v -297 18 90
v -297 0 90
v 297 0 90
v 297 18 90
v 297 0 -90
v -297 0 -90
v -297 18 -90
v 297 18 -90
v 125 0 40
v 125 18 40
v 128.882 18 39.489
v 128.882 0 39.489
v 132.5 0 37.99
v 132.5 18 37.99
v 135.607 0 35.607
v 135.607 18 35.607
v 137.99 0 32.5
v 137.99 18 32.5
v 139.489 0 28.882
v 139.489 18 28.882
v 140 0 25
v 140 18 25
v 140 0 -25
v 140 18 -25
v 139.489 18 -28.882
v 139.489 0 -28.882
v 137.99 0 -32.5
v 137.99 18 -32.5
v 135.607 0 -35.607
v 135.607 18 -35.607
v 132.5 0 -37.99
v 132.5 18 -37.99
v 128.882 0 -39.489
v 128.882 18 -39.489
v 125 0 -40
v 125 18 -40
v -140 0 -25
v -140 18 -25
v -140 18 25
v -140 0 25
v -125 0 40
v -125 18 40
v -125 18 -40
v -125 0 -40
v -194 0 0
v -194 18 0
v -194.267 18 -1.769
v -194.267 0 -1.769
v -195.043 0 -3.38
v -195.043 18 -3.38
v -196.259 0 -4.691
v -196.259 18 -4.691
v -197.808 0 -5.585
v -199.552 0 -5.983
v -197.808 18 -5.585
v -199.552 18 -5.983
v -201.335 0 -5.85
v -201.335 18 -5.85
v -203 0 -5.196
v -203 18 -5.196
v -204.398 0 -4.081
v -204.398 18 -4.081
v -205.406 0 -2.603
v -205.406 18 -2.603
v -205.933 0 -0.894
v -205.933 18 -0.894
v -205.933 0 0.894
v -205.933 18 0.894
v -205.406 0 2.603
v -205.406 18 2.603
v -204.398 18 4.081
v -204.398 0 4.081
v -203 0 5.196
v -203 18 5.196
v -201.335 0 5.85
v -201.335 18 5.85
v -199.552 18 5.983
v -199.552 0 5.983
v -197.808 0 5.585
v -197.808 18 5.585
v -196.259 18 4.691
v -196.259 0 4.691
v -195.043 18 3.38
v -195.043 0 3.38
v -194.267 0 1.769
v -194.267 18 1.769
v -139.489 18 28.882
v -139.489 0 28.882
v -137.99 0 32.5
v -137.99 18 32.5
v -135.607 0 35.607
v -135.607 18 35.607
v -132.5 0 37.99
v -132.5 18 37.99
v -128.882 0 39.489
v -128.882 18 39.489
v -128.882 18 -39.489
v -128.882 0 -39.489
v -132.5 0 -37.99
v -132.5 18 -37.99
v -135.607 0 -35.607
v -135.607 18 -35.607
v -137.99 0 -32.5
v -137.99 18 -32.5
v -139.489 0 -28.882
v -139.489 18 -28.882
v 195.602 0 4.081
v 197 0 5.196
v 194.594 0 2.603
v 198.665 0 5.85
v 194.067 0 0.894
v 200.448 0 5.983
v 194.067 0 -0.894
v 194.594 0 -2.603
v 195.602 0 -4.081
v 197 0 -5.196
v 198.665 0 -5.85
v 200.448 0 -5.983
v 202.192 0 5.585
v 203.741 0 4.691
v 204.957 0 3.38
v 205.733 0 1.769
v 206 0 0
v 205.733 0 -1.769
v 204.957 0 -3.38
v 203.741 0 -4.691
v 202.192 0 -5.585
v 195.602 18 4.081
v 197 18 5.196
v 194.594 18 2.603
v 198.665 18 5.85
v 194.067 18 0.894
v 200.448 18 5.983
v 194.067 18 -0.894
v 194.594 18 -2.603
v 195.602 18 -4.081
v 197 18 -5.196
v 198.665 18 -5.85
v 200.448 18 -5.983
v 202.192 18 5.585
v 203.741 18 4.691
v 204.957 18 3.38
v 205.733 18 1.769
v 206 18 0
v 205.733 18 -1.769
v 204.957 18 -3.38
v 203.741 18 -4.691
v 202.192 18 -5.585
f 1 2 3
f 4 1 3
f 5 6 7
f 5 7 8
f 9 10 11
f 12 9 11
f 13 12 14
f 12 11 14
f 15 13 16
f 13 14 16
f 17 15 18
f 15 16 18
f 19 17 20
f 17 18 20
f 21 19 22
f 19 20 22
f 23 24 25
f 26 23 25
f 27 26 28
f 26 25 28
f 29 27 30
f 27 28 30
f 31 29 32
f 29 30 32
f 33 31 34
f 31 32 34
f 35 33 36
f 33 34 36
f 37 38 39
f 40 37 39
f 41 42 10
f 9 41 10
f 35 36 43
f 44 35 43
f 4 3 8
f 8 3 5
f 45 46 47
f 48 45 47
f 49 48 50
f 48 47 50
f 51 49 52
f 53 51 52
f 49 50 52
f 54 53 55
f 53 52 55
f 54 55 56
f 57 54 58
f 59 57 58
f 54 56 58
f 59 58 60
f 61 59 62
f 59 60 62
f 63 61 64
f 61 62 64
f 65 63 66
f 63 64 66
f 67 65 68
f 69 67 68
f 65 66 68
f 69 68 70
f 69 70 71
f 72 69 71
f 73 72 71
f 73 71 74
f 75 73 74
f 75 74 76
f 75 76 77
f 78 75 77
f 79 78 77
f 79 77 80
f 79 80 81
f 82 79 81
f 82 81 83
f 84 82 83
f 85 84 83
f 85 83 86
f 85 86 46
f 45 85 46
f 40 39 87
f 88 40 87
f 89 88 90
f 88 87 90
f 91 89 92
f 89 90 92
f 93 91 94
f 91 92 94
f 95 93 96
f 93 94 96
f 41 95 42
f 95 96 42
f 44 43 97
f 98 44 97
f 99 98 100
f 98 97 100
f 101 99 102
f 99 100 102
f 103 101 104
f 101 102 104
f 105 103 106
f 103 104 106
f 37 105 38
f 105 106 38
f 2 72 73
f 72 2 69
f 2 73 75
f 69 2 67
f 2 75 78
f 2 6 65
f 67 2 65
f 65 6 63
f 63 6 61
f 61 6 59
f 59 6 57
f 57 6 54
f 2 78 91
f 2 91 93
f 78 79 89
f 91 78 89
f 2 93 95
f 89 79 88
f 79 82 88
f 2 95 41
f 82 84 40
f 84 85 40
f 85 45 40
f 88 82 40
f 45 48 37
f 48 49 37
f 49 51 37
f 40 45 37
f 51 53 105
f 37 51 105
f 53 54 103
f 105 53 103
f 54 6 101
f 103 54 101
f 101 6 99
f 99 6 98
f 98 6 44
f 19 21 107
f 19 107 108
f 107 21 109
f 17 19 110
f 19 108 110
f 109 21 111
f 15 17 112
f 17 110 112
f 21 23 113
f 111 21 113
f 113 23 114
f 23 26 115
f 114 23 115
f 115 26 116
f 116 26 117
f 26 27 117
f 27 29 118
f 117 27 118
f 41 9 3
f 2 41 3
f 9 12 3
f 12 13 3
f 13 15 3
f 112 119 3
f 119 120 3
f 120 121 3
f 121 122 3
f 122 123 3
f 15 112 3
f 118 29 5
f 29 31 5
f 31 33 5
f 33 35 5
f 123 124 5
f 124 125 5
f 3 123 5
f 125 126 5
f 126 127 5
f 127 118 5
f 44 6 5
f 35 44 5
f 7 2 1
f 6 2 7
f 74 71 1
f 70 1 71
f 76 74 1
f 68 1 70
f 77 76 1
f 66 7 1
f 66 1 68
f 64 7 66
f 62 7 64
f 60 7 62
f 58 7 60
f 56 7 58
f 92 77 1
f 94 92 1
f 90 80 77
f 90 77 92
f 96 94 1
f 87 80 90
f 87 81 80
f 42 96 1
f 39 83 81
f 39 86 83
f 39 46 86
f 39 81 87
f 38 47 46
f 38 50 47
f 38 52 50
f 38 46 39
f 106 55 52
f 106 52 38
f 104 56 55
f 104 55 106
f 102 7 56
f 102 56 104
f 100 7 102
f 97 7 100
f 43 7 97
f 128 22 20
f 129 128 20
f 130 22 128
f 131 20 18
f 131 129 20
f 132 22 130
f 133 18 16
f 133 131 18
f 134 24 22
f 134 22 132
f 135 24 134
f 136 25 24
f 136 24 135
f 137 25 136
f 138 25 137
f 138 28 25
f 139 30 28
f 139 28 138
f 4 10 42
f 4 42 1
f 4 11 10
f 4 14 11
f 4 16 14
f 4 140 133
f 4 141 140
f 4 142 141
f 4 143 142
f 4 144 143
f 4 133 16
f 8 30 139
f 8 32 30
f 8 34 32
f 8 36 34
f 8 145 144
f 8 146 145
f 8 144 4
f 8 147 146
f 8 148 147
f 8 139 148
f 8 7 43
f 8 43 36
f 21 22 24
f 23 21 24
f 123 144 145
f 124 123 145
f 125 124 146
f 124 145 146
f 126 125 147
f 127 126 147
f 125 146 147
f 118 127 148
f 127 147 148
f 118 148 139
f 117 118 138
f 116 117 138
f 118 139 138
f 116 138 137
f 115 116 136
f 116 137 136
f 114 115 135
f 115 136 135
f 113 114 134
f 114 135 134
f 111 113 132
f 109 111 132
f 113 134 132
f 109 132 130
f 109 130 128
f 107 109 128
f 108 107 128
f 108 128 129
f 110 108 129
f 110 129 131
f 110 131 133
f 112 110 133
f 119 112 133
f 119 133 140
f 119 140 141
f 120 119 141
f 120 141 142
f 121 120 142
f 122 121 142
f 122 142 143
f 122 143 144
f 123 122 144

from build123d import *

# Parameters (mm, degrees)
SKETCH1_W           = 594
SKETCH1_H           = 180
BOSS_EXTRUDE1_DEPTH = 18
SKETCH2_R           = 6
CUT_EXTRUDE1_DEPTH  = 40


with BuildPart() as part:
    # Sketch1 → Boss-Extrude1 (new body)
    with BuildSketch(Plane(origin=(0, 0, 0), x_dir=(1, 0, 0), z_dir=(0, 1, 0))):
        Rectangle(SKETCH1_W, SKETCH1_H)
    extrude(amount=BOSS_EXTRUDE1_DEPTH)

    # Sketch2 → Cut-Extrude1 (cut)
    with BuildSketch(Plane(origin=(0, 18, 0), x_dir=(1, 0, 0), z_dir=(0, 1, 0))):
        with Locations((-200, 0)):
            Circle(SKETCH2_R)
        with Locations((200, 0)):
            Circle(SKETCH2_R)
        with BuildLine():
            Line((-125, -40), (125, -40))
            ThreePointArc((125, -40), (135.606601718, -35.606601718), (140, -25))
            Line((140, -25), (140, 25))
            ThreePointArc((140, 25), (135.606601718, 35.606601718), (125, 40))
            Line((125, 40), (-125, 40))
            ThreePointArc((-125, 40), (-135.606601718, 35.606601718), (-140, 25))
            Line((-140, 25), (-140, -25))
            ThreePointArc((-140, -25), (-135.606601718, -35.606601718), (-125, -40))
        make_face()
    extrude(amount=-CUT_EXTRUDE1_DEPTH, mode=Mode.SUBTRACT)


solid = part.part
